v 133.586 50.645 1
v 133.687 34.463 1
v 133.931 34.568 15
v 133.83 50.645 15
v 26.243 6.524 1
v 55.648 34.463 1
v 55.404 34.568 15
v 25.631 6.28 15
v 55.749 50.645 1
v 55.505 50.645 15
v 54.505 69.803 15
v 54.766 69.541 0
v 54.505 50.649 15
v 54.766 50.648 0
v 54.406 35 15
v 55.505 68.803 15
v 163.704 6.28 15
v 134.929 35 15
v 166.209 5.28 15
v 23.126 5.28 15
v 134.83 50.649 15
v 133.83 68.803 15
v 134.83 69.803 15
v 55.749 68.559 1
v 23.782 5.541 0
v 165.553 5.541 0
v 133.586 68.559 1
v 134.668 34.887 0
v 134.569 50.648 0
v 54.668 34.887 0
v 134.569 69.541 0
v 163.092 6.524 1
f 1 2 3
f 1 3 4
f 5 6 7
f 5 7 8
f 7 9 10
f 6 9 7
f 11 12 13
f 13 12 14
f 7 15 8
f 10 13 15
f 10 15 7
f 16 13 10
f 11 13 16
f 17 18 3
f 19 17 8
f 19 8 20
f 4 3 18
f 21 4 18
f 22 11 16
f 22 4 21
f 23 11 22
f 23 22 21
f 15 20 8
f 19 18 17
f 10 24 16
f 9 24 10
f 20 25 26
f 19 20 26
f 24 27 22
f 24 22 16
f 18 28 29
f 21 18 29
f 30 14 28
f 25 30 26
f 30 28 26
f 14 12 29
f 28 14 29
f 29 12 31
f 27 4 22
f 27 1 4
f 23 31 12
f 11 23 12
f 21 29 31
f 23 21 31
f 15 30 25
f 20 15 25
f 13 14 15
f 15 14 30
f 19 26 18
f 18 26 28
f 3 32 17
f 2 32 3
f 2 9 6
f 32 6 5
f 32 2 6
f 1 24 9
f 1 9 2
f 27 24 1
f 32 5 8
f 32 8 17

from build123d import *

# Parameters (mm, degrees)
BOSS_EXTRUDE1_DEPTH = 15
BOSS_EXTRUDE1_DRAFT = -1
SHELL1_T            = -1


with BuildPart() as part:
    # Sketch4 → Boss-Extrude1 (with draft: the straight prism first)
    with BuildSketch(Plane.XY):
        Polygon((134.568658859, 69.541396533), (54.766431957, 69.541396533), (54.766431957, 50.647773961), (54.667545408, 34.886919054), (23.782154036, 5.541396533), (165.55293678, 5.541396533), (134.667545408, 34.886919054), (134.568658859, 50.647773961), align=None)
    extrude(amount=BOSS_EXTRUDE1_DEPTH)
    # Boss-Extrude1: the draft: its side faces are tilted about the plane it starts from
    boss_extrude1_sides = [part.faces().sort_by_distance(p)[0] for p in [
        (94.667545408, 69.541396533, 7.5),
        (54.766431957, 60.094585247, 7.5),
        (54.716988683, 42.767346508, 7.5),
        (39.224849722, 20.214157793, 7.5),
        (94.667545408, 5.541396533, 7.5),
        (150.110241094, 20.214157793, 7.5),
        (134.618102134, 42.767346508, 7.5),
        (134.568658859, 60.094585247, 7.5),
    ]]
    draft(boss_extrude1_sides, Plane.XY, BOSS_EXTRUDE1_DRAFT)

    # Shell1
    shell1_openings = [part.faces().sort_by_distance(p)[0] for p in [
        (94.667545408, 34.129623645, 15),
    ]]
    offset(amount=SHELL1_T, openings=shell1_openings, kind=Kind.INTERSECTION)


solid = part.part
